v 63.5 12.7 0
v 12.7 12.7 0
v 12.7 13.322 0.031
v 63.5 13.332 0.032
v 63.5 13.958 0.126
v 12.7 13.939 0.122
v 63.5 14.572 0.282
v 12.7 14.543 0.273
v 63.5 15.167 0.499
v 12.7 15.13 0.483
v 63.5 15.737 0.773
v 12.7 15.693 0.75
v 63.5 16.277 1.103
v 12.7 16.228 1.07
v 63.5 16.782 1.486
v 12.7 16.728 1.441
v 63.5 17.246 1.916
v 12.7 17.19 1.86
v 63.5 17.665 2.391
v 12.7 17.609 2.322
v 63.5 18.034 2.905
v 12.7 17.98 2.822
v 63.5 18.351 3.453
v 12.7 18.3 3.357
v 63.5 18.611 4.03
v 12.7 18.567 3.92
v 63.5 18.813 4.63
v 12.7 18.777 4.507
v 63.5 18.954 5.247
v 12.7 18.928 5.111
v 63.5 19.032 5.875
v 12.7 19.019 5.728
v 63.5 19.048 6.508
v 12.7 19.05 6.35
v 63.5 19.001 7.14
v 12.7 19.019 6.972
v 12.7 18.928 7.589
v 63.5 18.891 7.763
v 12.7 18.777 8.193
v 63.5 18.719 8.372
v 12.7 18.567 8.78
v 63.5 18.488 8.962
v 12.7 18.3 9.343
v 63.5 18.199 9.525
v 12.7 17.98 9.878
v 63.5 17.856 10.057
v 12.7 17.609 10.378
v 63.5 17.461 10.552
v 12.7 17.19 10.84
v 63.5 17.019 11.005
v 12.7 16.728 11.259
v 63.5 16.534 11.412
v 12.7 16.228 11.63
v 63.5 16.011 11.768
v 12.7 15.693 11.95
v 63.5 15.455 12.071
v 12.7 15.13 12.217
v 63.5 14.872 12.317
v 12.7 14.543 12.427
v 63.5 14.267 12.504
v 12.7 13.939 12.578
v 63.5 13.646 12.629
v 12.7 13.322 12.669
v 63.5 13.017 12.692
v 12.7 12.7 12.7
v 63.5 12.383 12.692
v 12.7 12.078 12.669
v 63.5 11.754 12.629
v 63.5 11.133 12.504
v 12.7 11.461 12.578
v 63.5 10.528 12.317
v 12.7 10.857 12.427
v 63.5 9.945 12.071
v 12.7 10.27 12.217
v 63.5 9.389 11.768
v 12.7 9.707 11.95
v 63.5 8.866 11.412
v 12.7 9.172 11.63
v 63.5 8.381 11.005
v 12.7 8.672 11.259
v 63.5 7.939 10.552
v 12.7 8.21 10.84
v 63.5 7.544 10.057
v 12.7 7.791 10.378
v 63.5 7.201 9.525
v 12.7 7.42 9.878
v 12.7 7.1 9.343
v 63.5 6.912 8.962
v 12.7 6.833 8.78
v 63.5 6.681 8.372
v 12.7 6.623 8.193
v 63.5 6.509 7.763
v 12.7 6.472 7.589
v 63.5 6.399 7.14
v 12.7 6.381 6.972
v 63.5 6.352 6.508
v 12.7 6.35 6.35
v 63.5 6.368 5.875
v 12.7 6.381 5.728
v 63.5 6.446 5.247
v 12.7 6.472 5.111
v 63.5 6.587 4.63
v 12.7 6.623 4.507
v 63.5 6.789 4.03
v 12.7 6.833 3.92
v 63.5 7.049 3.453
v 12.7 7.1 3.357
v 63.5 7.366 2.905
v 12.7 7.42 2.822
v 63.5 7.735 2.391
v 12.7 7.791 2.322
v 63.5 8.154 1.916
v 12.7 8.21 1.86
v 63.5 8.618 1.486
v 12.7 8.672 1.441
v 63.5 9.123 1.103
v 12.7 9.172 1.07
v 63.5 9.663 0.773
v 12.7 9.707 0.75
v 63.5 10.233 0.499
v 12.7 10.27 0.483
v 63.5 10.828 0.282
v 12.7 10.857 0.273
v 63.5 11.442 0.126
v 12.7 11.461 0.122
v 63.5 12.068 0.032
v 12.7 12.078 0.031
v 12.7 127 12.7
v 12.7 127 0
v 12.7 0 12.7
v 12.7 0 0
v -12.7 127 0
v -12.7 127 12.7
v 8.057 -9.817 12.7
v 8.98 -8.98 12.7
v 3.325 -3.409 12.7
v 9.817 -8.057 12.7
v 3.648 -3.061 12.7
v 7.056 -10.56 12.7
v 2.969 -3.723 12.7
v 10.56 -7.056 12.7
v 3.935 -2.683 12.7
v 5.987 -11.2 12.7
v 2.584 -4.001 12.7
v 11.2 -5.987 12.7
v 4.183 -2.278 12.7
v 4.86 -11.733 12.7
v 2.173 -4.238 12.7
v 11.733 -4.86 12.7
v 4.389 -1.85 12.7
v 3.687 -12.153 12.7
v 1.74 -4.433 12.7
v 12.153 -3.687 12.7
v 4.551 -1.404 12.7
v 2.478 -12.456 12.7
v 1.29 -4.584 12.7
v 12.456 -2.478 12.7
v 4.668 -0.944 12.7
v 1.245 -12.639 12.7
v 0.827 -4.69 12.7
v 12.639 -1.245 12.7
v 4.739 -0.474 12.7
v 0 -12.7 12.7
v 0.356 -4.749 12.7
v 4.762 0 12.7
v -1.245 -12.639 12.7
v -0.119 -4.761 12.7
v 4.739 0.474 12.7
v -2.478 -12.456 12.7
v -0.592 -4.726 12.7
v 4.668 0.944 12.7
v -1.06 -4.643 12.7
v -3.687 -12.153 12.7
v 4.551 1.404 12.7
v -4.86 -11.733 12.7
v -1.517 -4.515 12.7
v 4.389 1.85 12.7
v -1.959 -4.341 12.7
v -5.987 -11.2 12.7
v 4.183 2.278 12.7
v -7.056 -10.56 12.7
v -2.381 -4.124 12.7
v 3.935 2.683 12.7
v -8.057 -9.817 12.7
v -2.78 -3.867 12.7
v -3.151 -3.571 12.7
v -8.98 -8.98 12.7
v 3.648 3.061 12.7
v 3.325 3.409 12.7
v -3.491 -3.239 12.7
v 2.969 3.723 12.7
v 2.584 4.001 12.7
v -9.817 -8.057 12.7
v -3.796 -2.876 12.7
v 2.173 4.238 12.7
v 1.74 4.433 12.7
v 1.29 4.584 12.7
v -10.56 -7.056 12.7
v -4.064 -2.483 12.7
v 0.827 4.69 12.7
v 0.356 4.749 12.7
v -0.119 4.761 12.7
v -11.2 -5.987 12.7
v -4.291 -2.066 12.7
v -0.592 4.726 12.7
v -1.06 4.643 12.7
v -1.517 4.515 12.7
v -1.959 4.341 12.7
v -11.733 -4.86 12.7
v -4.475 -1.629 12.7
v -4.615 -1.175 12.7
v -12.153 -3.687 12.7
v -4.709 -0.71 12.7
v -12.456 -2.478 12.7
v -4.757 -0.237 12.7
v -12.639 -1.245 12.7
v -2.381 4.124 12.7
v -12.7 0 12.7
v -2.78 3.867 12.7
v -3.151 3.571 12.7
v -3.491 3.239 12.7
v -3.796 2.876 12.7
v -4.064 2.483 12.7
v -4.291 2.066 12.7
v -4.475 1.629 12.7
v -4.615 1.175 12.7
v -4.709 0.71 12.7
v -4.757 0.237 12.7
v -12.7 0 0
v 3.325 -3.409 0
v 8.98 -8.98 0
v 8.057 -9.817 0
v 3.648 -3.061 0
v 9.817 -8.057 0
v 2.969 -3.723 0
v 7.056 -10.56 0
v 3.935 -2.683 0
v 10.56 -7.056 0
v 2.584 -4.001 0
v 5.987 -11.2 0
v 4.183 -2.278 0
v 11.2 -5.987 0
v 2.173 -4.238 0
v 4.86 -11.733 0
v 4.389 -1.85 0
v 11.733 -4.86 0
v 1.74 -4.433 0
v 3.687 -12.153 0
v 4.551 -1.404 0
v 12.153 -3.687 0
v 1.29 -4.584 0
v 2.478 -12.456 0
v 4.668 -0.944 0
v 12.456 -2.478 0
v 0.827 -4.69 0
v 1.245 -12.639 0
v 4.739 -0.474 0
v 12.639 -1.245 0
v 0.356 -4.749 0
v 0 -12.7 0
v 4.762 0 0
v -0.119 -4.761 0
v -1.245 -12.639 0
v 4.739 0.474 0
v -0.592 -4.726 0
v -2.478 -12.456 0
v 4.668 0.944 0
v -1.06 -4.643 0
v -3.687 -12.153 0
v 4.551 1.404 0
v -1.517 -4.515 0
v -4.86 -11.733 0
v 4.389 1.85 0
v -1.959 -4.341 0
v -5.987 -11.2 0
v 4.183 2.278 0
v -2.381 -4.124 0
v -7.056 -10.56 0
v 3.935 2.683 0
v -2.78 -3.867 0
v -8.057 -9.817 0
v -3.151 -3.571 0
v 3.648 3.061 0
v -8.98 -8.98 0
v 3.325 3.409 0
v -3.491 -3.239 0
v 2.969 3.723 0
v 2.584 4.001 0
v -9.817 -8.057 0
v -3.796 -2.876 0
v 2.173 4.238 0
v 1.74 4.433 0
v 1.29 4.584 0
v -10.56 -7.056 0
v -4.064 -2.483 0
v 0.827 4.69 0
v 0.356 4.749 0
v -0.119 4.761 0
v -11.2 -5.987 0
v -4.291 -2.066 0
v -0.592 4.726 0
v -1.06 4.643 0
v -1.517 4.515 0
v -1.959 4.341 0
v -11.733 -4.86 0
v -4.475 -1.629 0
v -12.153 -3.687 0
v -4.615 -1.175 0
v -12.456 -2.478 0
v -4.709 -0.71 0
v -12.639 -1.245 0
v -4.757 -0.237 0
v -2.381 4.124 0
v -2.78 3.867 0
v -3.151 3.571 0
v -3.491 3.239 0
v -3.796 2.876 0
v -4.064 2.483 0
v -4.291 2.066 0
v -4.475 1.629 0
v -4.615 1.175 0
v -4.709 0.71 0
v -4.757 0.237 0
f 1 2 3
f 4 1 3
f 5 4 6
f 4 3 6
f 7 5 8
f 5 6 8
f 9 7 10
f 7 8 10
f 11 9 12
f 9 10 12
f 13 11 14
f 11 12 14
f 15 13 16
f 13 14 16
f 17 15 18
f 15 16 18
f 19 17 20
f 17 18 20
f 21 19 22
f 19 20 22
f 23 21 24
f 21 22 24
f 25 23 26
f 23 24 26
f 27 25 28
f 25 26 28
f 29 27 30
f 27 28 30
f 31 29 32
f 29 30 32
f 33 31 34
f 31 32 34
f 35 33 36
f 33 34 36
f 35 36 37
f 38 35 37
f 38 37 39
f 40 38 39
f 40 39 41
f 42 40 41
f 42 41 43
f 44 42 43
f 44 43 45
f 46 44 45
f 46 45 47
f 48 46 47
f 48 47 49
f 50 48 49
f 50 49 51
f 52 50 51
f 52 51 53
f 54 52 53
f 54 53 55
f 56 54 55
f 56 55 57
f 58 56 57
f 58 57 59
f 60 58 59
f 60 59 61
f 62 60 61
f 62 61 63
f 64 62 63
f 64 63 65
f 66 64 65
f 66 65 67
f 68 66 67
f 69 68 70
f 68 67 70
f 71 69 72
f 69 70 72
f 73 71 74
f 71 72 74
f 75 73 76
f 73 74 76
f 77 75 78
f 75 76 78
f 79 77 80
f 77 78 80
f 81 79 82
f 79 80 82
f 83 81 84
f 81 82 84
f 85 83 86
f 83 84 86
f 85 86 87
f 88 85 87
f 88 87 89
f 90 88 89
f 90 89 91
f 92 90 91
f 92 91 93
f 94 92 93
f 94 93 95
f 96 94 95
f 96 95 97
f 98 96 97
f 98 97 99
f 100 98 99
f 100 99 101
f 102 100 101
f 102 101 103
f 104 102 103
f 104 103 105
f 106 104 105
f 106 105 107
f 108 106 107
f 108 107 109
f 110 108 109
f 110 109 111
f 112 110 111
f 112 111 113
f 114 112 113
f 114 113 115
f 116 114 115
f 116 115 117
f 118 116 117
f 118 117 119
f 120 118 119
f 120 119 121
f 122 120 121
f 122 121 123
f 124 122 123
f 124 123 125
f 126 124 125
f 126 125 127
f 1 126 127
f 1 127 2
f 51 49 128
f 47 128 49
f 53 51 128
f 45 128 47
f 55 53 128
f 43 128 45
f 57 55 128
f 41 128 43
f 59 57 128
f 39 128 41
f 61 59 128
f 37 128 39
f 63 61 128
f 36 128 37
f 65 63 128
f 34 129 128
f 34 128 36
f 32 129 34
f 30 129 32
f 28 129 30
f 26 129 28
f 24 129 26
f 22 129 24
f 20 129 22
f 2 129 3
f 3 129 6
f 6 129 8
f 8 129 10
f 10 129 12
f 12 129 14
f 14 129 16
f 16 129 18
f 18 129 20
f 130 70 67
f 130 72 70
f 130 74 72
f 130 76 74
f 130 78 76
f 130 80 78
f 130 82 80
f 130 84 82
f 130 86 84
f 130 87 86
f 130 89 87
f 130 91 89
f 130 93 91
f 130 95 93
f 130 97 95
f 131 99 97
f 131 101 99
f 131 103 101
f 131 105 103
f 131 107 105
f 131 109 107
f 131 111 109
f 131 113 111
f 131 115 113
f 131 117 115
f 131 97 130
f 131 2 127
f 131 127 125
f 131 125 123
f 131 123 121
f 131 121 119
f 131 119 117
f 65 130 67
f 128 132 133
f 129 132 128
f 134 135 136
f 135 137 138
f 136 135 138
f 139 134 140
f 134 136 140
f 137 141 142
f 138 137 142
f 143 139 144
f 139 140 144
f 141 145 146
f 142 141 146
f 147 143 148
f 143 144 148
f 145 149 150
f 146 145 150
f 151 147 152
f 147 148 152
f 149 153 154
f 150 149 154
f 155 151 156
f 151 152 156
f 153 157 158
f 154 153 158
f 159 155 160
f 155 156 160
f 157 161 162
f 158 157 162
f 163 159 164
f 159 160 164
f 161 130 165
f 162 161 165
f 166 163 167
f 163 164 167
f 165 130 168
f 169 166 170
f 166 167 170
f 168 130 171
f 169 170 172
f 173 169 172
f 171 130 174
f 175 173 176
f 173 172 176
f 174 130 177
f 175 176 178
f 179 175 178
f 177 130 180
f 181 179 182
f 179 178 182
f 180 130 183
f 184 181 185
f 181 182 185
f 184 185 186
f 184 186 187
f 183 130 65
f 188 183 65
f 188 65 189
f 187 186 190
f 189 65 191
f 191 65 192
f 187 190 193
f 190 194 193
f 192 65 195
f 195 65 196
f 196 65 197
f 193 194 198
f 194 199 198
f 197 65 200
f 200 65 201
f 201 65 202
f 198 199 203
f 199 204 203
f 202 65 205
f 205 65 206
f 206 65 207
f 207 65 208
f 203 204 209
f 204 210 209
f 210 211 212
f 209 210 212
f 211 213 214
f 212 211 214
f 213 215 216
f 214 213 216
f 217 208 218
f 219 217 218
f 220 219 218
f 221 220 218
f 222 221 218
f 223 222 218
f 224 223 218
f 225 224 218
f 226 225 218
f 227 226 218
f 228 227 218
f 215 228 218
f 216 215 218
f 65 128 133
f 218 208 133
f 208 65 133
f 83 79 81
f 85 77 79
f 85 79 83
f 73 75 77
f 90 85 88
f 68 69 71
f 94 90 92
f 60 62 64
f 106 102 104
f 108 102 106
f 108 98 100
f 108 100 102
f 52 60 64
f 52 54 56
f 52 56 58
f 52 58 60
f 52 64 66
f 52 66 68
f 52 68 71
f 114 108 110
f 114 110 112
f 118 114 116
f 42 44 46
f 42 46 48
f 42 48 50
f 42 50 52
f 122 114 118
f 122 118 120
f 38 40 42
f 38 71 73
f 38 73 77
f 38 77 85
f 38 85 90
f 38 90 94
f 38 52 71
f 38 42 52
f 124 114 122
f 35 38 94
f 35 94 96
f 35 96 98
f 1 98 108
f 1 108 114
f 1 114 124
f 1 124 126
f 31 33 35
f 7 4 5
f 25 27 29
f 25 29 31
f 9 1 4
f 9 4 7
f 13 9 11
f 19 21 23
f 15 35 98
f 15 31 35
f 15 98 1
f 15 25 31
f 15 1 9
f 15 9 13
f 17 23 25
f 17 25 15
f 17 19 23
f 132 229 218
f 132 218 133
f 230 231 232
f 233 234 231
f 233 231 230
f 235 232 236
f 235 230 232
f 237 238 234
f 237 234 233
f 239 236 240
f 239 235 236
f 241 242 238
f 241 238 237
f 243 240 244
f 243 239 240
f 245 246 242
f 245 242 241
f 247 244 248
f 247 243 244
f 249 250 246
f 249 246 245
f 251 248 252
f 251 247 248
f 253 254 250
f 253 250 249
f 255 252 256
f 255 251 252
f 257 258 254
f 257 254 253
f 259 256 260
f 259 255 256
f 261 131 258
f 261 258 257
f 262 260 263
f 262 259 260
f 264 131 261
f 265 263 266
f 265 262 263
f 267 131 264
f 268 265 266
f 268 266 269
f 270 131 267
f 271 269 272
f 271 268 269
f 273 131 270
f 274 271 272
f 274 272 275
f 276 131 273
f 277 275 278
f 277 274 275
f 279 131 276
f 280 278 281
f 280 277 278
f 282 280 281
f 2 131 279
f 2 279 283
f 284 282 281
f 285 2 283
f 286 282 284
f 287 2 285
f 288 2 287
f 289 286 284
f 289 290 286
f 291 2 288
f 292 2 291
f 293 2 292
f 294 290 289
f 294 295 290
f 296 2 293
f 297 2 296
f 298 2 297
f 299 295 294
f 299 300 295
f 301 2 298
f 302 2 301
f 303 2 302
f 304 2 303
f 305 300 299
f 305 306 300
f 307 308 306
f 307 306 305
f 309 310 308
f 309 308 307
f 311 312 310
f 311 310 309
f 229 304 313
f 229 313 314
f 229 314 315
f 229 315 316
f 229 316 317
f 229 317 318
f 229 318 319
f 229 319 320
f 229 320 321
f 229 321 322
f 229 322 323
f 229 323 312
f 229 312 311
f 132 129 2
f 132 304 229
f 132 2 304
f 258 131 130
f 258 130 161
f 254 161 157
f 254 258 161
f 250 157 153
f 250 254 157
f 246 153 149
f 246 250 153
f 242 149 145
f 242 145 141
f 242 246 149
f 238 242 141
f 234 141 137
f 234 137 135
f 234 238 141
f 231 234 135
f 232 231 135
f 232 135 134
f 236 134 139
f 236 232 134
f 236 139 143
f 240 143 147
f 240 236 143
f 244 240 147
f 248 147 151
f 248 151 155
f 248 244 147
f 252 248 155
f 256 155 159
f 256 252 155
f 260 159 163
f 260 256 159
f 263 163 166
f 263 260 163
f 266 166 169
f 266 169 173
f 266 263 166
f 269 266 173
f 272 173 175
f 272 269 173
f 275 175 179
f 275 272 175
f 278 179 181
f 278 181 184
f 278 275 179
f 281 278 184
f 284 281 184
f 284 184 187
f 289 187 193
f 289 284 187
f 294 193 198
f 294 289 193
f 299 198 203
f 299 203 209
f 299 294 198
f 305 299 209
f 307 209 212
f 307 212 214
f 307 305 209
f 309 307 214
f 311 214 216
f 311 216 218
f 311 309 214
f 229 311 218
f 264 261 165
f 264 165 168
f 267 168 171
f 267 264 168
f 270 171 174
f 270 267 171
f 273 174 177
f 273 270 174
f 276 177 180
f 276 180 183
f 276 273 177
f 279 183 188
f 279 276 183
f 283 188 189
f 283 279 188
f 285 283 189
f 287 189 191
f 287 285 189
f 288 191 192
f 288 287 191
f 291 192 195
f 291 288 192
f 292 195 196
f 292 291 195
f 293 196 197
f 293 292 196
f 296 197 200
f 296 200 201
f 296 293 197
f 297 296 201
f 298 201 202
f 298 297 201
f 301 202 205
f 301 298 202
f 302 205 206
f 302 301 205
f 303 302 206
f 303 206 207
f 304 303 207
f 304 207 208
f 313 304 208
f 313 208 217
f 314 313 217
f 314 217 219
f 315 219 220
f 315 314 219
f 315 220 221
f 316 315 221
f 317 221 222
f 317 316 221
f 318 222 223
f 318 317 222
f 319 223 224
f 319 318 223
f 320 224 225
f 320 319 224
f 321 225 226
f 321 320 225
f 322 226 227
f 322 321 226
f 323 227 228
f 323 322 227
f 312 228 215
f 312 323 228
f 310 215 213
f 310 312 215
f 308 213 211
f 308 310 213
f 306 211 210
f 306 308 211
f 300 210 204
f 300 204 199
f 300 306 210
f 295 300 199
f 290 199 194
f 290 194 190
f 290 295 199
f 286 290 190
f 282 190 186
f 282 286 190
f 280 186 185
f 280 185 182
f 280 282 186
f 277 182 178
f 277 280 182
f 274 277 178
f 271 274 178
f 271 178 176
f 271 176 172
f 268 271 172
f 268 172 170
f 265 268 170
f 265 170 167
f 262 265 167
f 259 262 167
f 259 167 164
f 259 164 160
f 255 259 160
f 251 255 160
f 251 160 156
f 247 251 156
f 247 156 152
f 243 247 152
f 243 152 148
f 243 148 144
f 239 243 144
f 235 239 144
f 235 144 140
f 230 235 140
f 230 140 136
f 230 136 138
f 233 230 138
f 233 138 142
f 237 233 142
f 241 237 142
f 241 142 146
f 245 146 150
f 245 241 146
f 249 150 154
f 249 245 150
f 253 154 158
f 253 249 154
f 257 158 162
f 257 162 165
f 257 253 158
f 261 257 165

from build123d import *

# Parameters (mm, degrees)
SKETCH1_R           = 4.7625
BOSS_EXTRUDE1_DEPTH = 12.7
SKETCH2_R           = 6.35
BOSS_EXTRUDE2_DEPTH = 50.8


with BuildPart() as part:
    # Sketch1 → Boss-Extrude1 (new body)
    with BuildSketch(Plane.XY):
        with BuildLine():
            Line((-12.7, 0), (-12.7, 127))
            Line((-12.7, 127), (12.7, 127))
            Line((12.7, 127), (12.7, 0))
            ThreePointArc((12.7, 0), (0, -12.7), (-12.7, 0))
        make_face()
        Circle(SKETCH1_R, mode=Mode.SUBTRACT)
    extrude(amount=BOSS_EXTRUDE1_DEPTH)

    # Sketch2 → Boss-Extrude2 (add)
    with BuildSketch(Plane(origin=(12.7, 0, 0), x_dir=(0, 0, -1), z_dir=(1, 0, 0))):
        with Locations((-6.35, 12.7)):
            Circle(SKETCH2_R)
    extrude(amount=BOSS_EXTRUDE2_DEPTH)


solid = part.part
